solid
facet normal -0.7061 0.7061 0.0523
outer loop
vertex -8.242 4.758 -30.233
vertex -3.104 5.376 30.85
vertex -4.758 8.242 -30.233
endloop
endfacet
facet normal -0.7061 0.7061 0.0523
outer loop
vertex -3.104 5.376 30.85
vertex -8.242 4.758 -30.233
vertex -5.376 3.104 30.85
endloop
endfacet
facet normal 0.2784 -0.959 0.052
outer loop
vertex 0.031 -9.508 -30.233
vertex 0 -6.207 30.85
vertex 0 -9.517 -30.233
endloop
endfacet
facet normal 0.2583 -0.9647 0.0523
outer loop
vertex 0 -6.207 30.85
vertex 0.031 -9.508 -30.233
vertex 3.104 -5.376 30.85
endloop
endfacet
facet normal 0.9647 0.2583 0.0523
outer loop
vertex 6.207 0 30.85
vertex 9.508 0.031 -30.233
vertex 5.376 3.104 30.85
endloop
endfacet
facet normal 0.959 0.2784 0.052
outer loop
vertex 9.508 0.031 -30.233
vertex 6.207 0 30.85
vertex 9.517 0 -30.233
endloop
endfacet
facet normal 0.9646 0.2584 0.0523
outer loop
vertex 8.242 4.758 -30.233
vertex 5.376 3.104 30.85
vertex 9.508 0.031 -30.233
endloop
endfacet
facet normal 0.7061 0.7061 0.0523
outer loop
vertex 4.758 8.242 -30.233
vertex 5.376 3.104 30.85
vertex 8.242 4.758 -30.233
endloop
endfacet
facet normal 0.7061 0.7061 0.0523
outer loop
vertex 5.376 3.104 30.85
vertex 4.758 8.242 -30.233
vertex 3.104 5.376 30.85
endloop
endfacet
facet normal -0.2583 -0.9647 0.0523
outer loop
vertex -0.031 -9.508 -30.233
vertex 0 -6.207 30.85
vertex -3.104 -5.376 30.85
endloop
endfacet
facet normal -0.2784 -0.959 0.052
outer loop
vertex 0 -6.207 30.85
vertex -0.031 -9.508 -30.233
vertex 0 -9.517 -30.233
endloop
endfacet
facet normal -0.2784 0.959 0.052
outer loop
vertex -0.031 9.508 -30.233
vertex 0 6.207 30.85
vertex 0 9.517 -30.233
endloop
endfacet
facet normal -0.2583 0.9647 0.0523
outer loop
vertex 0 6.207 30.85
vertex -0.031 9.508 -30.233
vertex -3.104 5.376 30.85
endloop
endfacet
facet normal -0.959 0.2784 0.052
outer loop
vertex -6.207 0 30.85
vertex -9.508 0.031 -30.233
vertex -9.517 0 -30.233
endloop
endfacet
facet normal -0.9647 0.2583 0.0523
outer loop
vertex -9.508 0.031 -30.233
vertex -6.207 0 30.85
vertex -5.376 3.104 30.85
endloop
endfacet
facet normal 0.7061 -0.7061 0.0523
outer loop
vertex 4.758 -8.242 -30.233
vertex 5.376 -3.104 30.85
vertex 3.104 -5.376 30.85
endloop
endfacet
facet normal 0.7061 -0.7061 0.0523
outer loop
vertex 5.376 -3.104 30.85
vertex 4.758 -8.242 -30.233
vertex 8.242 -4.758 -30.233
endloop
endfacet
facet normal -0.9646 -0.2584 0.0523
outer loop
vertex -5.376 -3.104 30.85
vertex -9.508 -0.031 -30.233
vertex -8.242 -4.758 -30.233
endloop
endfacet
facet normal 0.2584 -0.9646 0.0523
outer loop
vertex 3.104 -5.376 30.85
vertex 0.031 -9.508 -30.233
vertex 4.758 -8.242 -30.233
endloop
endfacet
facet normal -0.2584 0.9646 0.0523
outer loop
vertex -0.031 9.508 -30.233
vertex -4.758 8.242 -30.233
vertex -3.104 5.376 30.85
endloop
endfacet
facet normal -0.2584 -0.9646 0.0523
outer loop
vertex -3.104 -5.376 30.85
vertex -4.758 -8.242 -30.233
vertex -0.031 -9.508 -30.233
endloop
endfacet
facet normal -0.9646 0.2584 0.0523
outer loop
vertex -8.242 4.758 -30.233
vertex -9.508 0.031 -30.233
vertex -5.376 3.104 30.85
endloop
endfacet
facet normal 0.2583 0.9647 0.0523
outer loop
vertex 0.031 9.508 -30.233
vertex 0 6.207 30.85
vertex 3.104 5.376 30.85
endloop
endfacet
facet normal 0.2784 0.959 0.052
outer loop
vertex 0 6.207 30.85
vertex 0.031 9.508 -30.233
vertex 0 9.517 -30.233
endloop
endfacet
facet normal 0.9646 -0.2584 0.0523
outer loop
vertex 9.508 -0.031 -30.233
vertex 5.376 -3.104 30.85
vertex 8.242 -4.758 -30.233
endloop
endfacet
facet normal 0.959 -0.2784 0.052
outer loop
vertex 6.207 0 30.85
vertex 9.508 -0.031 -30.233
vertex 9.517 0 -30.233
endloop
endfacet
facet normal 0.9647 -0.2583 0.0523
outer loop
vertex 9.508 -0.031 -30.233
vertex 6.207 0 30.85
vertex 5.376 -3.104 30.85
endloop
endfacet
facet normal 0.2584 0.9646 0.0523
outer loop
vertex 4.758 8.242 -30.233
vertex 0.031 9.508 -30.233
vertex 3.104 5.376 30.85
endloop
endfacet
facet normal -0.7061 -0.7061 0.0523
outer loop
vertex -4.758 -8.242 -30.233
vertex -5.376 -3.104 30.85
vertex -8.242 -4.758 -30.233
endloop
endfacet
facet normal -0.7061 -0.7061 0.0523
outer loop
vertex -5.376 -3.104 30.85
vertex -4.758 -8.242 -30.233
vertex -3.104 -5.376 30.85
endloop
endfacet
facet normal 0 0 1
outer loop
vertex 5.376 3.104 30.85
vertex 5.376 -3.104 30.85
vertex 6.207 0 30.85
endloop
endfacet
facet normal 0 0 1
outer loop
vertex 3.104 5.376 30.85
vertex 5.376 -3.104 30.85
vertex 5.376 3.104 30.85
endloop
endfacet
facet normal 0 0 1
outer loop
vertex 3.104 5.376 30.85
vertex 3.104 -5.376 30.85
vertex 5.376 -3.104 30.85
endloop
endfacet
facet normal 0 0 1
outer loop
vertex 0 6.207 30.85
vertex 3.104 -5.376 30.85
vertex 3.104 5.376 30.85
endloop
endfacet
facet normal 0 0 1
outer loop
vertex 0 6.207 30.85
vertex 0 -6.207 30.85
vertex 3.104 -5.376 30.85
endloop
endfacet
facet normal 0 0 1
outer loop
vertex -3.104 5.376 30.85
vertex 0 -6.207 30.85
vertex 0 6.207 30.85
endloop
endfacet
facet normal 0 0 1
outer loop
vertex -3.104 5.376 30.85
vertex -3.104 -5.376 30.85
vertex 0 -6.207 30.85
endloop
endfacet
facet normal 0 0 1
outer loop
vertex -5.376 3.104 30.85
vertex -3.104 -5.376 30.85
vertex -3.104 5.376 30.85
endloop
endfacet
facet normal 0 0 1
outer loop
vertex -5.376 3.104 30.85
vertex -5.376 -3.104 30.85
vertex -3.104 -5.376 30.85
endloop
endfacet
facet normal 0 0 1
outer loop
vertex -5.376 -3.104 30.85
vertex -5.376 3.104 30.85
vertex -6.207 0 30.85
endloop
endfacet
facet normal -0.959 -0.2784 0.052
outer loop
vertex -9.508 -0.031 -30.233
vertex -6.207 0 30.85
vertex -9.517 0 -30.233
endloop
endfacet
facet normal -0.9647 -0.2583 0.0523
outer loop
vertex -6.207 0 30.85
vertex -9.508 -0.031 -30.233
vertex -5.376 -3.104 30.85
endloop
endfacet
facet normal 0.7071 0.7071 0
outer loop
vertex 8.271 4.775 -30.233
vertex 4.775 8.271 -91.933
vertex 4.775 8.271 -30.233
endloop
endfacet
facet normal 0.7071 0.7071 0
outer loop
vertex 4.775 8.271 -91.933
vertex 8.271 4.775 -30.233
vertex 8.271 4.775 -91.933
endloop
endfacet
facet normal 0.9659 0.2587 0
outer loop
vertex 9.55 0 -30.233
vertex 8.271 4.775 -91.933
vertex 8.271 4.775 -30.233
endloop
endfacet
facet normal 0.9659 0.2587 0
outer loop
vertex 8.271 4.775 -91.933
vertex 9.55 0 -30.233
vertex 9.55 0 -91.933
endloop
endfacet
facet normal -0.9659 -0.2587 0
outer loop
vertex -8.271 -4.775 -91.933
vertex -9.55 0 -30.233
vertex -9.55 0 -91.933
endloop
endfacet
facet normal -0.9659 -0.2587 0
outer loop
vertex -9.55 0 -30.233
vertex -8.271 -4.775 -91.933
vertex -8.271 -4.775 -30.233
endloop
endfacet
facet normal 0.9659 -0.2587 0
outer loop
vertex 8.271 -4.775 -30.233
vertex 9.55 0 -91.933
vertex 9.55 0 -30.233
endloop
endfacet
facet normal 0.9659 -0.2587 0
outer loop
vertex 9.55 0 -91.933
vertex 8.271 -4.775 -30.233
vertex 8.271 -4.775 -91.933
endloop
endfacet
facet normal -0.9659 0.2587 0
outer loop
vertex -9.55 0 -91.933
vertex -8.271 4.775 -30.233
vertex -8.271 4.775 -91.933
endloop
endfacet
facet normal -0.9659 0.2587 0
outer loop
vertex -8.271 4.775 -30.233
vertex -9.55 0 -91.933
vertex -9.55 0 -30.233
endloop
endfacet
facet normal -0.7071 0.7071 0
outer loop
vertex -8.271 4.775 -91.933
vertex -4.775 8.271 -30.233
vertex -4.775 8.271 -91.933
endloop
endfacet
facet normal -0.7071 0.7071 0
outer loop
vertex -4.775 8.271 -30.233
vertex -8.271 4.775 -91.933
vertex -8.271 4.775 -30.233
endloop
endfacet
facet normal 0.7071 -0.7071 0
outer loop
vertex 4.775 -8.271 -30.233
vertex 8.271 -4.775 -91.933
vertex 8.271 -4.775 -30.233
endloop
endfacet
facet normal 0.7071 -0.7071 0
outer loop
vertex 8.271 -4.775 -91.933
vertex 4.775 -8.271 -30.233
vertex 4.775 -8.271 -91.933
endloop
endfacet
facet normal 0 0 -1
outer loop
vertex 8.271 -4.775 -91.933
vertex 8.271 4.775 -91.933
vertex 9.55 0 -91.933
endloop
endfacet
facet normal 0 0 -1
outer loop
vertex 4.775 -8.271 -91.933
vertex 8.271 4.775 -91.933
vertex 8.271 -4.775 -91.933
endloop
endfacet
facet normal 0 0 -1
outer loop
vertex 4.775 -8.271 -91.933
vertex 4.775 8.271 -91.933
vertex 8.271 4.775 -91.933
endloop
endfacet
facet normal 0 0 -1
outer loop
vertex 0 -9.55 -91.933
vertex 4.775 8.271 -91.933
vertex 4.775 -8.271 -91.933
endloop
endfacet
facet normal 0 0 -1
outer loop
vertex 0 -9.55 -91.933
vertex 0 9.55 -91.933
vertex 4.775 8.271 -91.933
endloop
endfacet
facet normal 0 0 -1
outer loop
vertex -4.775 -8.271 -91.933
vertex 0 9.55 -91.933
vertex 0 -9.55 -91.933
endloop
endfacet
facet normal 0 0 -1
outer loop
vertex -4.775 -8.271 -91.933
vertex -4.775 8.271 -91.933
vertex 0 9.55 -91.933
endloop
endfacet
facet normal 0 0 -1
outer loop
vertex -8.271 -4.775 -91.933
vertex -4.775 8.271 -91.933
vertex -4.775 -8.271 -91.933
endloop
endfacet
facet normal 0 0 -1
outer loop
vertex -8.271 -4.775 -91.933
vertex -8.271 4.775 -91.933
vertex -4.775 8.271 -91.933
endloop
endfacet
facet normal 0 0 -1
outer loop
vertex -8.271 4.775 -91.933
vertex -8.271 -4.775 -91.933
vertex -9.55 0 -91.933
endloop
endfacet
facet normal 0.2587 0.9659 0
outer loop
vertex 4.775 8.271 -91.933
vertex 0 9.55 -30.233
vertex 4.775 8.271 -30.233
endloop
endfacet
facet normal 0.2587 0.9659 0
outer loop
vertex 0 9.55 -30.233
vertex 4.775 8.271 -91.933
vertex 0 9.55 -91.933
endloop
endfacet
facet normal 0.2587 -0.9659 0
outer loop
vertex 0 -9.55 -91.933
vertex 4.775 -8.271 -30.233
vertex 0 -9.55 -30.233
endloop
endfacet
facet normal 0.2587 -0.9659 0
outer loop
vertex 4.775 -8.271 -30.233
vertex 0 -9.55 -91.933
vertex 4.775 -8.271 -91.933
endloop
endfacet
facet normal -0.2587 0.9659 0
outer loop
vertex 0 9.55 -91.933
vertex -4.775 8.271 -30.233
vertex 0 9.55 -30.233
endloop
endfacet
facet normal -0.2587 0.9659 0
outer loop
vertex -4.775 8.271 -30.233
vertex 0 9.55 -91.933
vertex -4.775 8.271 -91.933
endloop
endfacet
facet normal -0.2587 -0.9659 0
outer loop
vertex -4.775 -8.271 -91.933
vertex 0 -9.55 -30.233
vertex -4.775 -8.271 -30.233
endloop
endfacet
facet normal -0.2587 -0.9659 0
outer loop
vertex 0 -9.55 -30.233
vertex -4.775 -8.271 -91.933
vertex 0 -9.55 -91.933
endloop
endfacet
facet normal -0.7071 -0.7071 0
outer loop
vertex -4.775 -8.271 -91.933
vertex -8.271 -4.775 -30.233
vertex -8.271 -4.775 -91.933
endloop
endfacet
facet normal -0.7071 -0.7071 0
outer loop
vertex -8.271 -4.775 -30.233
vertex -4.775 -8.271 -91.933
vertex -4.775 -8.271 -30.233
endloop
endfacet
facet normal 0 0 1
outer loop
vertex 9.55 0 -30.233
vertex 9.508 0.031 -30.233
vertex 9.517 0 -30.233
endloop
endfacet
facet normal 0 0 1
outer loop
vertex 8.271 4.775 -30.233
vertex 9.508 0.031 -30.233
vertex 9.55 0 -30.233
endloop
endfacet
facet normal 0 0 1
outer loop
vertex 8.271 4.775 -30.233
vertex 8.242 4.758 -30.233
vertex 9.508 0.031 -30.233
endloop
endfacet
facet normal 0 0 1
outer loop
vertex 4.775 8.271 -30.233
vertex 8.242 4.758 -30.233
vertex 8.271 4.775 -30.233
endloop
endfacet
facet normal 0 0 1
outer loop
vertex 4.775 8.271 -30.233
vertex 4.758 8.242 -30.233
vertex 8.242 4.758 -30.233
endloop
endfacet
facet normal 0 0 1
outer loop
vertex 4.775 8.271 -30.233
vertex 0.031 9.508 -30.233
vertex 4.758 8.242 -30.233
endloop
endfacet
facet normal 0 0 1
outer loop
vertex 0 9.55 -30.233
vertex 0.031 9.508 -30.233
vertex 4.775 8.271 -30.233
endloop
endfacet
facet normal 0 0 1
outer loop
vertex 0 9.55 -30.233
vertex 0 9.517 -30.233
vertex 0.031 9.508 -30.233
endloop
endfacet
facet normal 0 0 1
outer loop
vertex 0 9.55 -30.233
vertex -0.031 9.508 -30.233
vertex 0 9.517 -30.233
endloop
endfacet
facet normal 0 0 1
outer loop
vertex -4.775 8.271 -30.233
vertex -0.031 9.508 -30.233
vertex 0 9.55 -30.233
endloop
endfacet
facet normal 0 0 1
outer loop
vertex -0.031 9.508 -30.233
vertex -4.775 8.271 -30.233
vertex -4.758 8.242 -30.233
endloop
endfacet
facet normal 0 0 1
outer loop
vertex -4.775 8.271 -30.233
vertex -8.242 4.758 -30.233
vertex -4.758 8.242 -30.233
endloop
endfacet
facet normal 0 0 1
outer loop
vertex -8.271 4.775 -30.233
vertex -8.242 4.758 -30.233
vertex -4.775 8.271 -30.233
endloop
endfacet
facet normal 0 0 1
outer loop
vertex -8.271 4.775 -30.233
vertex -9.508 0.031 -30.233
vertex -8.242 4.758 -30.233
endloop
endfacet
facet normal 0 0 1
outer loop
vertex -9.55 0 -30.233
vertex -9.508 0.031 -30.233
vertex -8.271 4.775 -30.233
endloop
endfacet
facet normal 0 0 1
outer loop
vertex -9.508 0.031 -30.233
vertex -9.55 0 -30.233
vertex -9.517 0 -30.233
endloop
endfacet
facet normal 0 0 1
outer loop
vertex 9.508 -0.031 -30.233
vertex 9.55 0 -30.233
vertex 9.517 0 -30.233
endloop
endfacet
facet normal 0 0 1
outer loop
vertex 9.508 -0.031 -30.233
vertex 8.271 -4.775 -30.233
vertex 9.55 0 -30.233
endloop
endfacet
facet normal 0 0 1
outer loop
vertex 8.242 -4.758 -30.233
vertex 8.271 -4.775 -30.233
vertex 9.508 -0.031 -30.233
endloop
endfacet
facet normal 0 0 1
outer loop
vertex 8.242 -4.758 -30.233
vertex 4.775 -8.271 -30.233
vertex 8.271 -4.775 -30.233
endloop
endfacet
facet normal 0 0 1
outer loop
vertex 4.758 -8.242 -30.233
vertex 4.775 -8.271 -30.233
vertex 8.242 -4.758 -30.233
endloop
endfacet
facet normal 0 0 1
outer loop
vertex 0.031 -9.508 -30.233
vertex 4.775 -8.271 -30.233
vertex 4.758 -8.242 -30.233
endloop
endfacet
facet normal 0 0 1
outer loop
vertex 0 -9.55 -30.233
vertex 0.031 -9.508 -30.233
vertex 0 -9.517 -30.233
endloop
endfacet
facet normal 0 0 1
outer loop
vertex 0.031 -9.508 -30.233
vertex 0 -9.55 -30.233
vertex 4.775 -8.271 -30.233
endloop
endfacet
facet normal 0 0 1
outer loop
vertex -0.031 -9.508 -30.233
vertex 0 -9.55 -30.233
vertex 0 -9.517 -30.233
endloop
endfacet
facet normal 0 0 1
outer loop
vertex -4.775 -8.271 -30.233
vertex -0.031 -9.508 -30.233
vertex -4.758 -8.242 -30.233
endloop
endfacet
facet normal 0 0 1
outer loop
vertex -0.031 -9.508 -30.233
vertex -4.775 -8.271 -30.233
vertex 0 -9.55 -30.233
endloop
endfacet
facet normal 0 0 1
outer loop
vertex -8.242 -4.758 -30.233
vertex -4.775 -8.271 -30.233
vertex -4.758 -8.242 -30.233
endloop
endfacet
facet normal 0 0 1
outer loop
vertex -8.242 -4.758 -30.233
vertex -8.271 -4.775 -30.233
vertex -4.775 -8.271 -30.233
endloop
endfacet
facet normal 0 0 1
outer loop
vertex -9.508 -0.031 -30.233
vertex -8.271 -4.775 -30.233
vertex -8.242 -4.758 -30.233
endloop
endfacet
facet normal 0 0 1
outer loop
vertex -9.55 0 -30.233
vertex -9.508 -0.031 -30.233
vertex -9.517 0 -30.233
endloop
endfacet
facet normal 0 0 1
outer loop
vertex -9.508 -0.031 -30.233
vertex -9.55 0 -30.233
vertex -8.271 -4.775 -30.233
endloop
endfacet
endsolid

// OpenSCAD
/*
Shaft Diameter 	3/4 in. / 19.1 mm
Shaft length (in.) 	2.43 in. / 61.7 mm
Keyway 	3/16 in. / 4.76 mm
https://www.harborfreight.com/65-hp-212cc-ohv-horizontal-shaft-gas-engine-epa-69730.html

*/
$fn=12;
diameter=19.1;
length=61.7;
keyway=4.76;

color("blue")
cylinder(h=length, d1=diameter, d2=diameter*.65, center=true);

translate([0, 0, -length*.99])
cylinder(h=length, d=diameter, center=true);


/*
translate([ 0.00, 0.00, length/2]) {
color("red")
{
    linear_extrude(length, center=true) 
    {
    circle(d=diameter);
    }
}
translate([diameter/2, 0, 0]) {
    color("blue")
    {
        linear_extrude(length, center=true)
        {
            square(4.76, center=true);
        }
    }
}
}
*/
    
/*
,        color("red")
        {
            linear_extrude(length*1.1, center=true)
            {
                square(4.76, center=true);
            }
        }
    }
    */
